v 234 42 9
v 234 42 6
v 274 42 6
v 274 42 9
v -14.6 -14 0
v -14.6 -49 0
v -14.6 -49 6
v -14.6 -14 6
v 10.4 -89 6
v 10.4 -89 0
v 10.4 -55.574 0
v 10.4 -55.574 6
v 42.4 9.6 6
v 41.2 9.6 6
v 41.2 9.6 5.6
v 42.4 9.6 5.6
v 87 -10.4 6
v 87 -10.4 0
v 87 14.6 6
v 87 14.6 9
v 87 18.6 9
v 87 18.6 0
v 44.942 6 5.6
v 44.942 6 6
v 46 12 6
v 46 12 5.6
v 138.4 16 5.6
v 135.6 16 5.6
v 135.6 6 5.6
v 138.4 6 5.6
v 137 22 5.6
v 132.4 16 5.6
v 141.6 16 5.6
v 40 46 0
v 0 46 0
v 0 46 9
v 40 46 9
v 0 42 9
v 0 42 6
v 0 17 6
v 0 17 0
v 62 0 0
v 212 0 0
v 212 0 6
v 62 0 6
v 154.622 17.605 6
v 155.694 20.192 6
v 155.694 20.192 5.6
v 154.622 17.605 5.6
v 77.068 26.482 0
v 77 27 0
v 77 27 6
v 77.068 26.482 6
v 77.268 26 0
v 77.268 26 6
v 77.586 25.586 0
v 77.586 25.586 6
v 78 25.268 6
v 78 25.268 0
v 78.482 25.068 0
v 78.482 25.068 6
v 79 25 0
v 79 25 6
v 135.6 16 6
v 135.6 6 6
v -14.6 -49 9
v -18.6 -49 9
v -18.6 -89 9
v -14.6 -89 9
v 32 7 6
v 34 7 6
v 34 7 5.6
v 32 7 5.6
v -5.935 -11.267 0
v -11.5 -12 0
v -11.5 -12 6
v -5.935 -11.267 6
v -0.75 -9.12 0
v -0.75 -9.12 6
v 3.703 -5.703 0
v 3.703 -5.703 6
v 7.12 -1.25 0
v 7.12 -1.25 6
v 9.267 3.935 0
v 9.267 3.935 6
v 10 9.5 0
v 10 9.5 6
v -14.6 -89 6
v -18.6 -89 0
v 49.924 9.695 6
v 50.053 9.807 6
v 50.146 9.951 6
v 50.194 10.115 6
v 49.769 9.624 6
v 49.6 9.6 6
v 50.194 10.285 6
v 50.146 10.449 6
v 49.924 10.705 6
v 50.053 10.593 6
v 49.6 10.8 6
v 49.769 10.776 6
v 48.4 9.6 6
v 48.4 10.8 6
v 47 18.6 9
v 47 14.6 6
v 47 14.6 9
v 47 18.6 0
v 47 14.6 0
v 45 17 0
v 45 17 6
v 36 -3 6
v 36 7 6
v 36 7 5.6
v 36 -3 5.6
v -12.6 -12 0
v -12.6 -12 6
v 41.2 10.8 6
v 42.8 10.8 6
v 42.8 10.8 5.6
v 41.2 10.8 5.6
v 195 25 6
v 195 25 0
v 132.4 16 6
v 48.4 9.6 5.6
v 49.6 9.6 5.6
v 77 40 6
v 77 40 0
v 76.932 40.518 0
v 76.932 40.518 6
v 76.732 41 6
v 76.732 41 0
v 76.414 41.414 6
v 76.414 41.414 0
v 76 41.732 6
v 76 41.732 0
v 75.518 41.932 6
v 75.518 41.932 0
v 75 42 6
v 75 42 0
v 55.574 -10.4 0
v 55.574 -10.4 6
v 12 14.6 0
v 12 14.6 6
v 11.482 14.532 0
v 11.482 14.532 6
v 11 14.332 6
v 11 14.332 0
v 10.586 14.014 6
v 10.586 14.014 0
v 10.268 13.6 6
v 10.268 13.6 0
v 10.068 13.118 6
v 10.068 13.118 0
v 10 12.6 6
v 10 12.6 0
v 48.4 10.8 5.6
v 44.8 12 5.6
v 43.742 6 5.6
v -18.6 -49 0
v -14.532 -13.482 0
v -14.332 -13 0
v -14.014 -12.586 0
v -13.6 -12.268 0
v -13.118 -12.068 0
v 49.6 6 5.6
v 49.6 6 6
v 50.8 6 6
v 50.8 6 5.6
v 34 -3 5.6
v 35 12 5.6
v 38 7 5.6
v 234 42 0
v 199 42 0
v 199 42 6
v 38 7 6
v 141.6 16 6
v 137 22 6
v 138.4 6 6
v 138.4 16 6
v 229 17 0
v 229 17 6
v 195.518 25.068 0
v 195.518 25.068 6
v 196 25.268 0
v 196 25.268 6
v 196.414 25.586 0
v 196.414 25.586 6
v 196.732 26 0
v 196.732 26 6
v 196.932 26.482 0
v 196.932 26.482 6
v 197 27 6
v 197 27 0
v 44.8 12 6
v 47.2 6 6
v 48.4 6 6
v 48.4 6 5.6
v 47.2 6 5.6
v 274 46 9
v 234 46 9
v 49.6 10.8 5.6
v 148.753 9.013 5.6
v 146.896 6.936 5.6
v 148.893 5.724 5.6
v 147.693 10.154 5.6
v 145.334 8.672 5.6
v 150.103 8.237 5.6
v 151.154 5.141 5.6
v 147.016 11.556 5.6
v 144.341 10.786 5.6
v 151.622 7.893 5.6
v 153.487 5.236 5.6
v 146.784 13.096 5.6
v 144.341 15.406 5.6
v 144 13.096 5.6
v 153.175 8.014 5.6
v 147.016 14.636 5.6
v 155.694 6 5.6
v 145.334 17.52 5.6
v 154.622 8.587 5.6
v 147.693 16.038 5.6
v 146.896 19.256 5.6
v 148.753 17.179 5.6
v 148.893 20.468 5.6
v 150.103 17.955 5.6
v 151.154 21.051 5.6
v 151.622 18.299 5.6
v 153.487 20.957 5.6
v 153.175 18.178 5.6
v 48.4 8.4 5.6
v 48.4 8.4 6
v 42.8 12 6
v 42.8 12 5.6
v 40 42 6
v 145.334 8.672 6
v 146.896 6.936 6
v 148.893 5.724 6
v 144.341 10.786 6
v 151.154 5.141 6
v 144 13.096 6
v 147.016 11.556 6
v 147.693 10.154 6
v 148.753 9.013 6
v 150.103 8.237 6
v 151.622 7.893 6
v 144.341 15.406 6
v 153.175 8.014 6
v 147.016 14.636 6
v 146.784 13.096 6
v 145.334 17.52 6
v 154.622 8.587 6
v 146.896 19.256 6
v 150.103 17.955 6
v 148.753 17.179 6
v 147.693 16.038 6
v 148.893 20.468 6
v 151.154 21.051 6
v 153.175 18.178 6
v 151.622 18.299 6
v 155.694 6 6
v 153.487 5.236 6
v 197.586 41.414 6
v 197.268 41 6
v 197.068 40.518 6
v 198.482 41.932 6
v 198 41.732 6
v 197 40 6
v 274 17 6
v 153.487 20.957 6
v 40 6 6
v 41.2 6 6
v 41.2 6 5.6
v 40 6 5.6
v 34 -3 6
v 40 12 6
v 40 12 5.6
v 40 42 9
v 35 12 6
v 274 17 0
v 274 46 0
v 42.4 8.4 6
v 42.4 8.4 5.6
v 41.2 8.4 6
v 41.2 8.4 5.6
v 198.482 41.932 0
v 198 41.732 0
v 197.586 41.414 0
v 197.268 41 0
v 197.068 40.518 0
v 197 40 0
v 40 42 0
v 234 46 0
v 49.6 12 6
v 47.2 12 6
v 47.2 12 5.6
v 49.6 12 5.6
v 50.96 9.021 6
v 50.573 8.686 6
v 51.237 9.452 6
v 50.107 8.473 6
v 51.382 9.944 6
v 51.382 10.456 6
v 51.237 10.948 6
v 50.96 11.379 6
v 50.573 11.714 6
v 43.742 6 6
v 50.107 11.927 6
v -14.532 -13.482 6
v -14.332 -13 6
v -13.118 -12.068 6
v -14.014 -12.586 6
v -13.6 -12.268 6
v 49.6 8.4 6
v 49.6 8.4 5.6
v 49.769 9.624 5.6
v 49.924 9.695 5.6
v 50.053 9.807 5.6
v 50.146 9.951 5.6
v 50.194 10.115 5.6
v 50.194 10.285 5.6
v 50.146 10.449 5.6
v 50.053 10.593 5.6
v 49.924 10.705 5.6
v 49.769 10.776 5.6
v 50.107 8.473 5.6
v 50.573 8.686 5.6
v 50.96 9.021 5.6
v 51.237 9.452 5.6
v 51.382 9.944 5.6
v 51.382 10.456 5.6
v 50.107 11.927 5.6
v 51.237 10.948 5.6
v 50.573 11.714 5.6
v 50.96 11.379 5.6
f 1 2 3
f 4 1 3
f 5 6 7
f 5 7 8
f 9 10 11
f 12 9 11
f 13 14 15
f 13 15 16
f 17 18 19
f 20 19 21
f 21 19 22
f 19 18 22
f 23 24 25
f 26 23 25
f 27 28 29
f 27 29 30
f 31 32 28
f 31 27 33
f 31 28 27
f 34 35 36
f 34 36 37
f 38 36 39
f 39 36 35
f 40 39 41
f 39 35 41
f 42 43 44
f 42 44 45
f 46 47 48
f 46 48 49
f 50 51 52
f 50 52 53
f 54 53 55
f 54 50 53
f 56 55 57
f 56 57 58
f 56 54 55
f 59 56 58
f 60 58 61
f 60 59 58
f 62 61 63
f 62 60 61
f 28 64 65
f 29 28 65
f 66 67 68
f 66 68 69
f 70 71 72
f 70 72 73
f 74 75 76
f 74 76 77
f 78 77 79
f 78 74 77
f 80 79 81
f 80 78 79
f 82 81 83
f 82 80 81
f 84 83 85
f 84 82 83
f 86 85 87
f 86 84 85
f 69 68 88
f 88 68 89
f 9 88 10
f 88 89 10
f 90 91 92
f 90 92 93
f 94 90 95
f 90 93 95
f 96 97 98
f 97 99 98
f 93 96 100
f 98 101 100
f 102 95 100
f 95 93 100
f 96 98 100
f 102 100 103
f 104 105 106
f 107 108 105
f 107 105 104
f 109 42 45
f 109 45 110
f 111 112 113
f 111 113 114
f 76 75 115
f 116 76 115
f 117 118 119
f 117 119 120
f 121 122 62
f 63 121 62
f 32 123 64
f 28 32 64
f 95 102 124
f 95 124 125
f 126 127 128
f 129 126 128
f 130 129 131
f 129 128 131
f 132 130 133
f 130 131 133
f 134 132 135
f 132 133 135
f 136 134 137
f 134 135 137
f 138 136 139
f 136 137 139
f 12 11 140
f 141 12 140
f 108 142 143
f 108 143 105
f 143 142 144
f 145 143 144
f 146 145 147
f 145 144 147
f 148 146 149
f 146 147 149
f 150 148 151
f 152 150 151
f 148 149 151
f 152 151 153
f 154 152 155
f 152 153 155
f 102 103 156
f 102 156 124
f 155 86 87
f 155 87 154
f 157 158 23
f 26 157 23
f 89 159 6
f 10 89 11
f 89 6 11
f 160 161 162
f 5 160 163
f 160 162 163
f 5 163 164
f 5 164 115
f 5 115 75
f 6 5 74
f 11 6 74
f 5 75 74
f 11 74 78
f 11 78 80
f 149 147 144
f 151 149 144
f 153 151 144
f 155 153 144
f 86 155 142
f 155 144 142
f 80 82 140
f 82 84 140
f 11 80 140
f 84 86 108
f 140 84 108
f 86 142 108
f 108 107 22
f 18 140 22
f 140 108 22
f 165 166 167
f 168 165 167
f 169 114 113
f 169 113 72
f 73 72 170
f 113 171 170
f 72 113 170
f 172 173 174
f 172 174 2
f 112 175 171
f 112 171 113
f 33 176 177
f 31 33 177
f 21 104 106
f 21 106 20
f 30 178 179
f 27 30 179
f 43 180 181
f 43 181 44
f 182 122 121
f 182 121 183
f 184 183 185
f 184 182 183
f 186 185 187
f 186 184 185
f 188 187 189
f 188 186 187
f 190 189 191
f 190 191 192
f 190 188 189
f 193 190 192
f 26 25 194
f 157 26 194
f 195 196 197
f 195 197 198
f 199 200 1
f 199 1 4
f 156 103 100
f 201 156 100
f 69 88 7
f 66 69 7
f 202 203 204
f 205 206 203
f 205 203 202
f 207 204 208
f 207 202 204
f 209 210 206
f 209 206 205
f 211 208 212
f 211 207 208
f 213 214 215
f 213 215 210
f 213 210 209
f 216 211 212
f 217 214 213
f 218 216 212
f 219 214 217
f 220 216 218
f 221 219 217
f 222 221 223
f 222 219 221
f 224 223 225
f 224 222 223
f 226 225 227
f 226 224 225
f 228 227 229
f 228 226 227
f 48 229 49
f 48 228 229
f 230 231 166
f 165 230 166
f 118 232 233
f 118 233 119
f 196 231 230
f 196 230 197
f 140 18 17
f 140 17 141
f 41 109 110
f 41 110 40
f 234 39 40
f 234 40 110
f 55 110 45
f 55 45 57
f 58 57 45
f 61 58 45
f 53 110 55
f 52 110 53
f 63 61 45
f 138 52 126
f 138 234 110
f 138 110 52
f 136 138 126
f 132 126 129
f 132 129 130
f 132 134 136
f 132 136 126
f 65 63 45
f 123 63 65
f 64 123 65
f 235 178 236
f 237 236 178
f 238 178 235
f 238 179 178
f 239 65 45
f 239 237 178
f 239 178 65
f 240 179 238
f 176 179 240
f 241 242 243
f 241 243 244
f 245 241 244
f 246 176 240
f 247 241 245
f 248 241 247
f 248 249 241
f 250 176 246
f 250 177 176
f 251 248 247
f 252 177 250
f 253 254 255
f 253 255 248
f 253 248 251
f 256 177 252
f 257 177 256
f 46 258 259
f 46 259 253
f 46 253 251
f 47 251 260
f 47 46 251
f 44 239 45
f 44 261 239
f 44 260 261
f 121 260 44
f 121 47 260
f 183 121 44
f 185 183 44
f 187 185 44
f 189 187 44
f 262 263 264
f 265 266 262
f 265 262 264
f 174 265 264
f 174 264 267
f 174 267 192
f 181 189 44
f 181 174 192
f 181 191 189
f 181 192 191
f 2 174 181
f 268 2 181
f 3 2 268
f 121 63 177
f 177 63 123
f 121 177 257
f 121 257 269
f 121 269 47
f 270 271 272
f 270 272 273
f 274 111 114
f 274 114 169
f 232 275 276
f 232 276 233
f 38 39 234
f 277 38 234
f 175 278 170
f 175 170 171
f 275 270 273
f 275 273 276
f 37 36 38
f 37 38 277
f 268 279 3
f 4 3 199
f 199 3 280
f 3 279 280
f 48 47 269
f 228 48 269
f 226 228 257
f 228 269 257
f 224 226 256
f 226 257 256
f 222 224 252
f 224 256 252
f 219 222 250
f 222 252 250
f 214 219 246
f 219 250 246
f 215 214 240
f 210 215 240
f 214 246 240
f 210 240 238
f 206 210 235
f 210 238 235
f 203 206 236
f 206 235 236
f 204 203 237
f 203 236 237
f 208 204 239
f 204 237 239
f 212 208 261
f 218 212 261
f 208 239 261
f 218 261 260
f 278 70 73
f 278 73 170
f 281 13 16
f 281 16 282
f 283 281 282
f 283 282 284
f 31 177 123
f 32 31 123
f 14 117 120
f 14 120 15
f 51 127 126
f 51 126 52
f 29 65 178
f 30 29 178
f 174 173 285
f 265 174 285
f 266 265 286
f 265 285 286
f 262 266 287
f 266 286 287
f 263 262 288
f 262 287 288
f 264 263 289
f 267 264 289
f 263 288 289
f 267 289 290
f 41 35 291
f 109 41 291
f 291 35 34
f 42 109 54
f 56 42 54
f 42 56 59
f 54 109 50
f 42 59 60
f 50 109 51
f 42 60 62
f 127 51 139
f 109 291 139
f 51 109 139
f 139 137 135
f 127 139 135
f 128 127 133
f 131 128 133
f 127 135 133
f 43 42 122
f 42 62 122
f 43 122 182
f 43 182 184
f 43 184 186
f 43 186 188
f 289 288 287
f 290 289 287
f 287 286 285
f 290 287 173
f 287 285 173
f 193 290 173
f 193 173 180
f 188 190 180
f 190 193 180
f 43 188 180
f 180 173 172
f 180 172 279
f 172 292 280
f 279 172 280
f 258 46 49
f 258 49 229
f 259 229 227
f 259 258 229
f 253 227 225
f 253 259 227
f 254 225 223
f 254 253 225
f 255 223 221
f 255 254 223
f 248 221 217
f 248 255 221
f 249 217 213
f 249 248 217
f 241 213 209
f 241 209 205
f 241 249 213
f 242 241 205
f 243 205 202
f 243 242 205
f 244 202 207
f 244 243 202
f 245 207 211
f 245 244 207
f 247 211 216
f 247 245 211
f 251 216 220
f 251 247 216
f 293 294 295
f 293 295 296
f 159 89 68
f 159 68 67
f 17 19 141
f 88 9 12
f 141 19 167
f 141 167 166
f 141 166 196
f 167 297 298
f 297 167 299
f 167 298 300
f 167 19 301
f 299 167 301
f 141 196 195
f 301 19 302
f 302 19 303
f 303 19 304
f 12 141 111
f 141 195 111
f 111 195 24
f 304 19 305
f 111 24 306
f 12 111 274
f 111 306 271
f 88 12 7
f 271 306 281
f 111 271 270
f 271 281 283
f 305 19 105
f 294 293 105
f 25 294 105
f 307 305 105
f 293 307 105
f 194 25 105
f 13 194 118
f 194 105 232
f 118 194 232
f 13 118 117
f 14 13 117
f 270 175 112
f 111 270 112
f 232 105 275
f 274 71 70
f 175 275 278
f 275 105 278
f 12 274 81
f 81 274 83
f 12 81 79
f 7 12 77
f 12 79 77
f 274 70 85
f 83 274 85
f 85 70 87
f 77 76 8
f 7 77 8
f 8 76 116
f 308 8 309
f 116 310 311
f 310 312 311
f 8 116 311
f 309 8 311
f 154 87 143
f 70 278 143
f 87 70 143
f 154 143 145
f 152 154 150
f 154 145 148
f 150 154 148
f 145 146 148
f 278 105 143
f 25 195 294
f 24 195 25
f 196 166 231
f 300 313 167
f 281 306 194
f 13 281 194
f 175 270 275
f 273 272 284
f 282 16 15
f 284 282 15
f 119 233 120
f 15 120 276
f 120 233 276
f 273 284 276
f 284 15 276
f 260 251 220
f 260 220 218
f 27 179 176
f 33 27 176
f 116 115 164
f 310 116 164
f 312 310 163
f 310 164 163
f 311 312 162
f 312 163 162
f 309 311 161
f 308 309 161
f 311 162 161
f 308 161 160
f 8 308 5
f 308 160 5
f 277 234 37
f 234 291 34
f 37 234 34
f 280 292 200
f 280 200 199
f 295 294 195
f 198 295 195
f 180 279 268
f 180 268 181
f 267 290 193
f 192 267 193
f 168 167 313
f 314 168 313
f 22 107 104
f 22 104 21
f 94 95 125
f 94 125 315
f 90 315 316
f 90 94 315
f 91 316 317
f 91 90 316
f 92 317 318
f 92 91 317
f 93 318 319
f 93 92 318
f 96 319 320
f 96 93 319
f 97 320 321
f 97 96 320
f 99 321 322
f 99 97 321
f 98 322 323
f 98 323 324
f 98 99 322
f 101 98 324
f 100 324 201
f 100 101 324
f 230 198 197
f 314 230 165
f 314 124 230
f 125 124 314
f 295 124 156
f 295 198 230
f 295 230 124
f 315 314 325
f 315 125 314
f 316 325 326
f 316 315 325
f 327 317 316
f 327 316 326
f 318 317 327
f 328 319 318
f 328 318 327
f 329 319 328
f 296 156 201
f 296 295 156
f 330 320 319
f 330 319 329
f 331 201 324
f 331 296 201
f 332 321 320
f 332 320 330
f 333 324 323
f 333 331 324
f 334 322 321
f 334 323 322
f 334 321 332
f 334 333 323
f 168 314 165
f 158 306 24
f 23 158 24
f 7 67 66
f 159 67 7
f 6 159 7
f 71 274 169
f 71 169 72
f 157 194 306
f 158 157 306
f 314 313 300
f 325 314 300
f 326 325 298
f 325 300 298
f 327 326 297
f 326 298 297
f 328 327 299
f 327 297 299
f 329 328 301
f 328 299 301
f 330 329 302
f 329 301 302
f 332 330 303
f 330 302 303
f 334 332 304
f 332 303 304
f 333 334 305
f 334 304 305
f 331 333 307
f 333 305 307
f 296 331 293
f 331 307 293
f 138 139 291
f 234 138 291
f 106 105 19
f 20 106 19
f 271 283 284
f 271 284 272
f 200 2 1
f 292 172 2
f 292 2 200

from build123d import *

# Parameters (mm, degrees)
PAD_DEPTH       = 6
SKETCH002_W     = 40
SKETCH002_H     = 4
SKETCH002_W_2   = 4
SKETCH002_H_2   = 40
PAD001_DEPTH    = 9
POCKET_DEPTH    = 0.4
PAD002_DEPTH    = 6
SKETCH005_W     = 40
SKETCH005_H     = 4
PAD003_DEPTH    = 9
POCKET001_DEPTH = 0.4


with BuildPart() as corner:
    # Sketch001 → Pad (new body)
    with BuildSketch(Plane.XY):
        with BuildLine():
            ThreePointArc((-11.5, -12), (3.702796, -5.702796), (10, 9.5))
            Line((10, 9.5), (10, 12.6))
            ThreePointArc((12, 14.6), (10.585786, 14.014214), (10, 12.6))
            Line((12, 14.6), (87, 14.6))
            Line((87, 14.6), (87, -10.4))
            Line((87, -10.4), (55.574134, -10.4))
            Line((10.4, -55.574134), (55.574134, -10.4))
            Line((10.4, -89), (10.4, -55.574134))
            Line((-14.6, -89), (10.4, -89))
            Line((-14.6, -89), (-14.6, -14))
            ThreePointArc((-12.6, -12), (-14.014214, -12.585786), (-14.6, -14))
            Line((-11.5, -12), (-12.6, -12))
        make_face()
    extrude(amount=PAD_DEPTH)

    # Sketch002 → Pad001 (join)
    with BuildSketch(Plane.XY):
        with Locations((67, 16.6)):
            Rectangle(SKETCH002_W, SKETCH002_H)
        with Locations((-16.6, -69)):
            Rectangle(SKETCH002_W_2, SKETCH002_H_2)
    extrude(amount=PAD001_DEPTH)

    # Sketch003 (on Face4 of Pad001) → Pocket (cut)
    with BuildSketch(Plane.XY.offset(6)):
        Polygon((34, -3), (34, 7), (32, 7), (35, 12), (38, 7), (36, 7), (36, -3), align=None)
        Polygon((40, 6), (40, 12), (42.8, 12), (42.8, 10.8), (41.2, 10.8), (41.2, 9.6), (42.4, 9.6), (42.4, 8.4), (41.2, 8.4), (41.2, 6), align=None)
        Polygon((44.8, 12), (43.742038, 6), (44.942038, 6), (46, 12), align=None)
        with BuildLine():
            Line((47.2, 12), (47.2, 6))
            Line((48.4, 6), (47.2, 6))
            Line((48.4, 8.4), (48.4, 6))
            Line((48.4, 8.4), (49.6, 6))
            Line((49.6, 6), (50.8, 6))
            Line((50.8, 6), (49.6, 8.4))
            ThreePointArc((49.6, 8.4), (51.4, 10.2), (49.6, 12))
            Line((47.2, 12), (49.6, 12))
        make_face()
        with BuildLine():
            Line((48.4, 10.8), (48.4, 9.6))
            Line((48.4, 9.6), (49.6, 9.6))
            ThreePointArc((49.6, 9.6), (50.2, 10.2), (49.6, 10.8))
            Line((48.4, 10.8), (49.6, 10.8))
        make_face(mode=Mode.SUBTRACT)
    extrude(amount=-POCKET_DEPTH, mode=Mode.SUBTRACT)


with BuildPart() as screen:
    # Sketch004 → Pad002 (new body)
    with BuildSketch(Plane.XY):
        with BuildLine():
            ThreePointArc((77, 40), (76.414214, 41.414214), (75, 42))
            Line((75, 42), (0, 42))
            Line((0, 42), (0, 17))
            Line((45, 17), (0, 17))
            Line((62, 0), (45, 17))
            Line((212, 0), (62, 0))
            Line((229, 17), (212, 0))
            Line((274, 17), (229, 17))
            Line((274, 42), (274, 17))
            Line((199, 42), (274, 42))
            ThreePointArc((199, 42), (197.585786, 41.414214), (197, 40))
            Line((197, 40), (197, 27))
            ThreePointArc((195, 25), (196.414214, 25.585786), (197, 27))
            Line((195, 25), (79, 25))
            ThreePointArc((77, 27), (77.585786, 25.585786), (79, 25))
            Line((77, 40), (77, 27))
        make_face()
    extrude(amount=PAD002_DEPTH)

    # Sketch005 → Pad003 (join)
    with BuildSketch(Plane.XY):
        with Locations((254, 44)):
            Rectangle(SKETCH005_W, SKETCH005_H)
        with Locations((20, 44)):
            Rectangle(SKETCH005_W, SKETCH005_H)
    extrude(amount=PAD003_DEPTH)

    # Sketch006 (on Face4 of Pad003) → Pocket001 (cut)
    with BuildSketch(Plane.XY.offset(6)):
        Polygon((137, 22), (132.4, 16), (135.6, 16), (135.6, 6), (138.4, 6), (138.4, 16), (141.6, 16), align=None)
        with BuildLine():
            ThreePointArc((155.693989, 20.192173), (144, 13.096087), (155.693989, 6))
            Line((154.622475, 8.586863), (155.693989, 6))
            ThreePointArc((154.622475, 17.605311), (146.783634, 13.096087), (154.622475, 8.586863))
            Line((155.693989, 20.192173), (154.622475, 17.605311))
        make_face()
    extrude(amount=-POCKET001_DEPTH, mode=Mode.SUBTRACT)


solid = Compound([corner.part, screen.part])
